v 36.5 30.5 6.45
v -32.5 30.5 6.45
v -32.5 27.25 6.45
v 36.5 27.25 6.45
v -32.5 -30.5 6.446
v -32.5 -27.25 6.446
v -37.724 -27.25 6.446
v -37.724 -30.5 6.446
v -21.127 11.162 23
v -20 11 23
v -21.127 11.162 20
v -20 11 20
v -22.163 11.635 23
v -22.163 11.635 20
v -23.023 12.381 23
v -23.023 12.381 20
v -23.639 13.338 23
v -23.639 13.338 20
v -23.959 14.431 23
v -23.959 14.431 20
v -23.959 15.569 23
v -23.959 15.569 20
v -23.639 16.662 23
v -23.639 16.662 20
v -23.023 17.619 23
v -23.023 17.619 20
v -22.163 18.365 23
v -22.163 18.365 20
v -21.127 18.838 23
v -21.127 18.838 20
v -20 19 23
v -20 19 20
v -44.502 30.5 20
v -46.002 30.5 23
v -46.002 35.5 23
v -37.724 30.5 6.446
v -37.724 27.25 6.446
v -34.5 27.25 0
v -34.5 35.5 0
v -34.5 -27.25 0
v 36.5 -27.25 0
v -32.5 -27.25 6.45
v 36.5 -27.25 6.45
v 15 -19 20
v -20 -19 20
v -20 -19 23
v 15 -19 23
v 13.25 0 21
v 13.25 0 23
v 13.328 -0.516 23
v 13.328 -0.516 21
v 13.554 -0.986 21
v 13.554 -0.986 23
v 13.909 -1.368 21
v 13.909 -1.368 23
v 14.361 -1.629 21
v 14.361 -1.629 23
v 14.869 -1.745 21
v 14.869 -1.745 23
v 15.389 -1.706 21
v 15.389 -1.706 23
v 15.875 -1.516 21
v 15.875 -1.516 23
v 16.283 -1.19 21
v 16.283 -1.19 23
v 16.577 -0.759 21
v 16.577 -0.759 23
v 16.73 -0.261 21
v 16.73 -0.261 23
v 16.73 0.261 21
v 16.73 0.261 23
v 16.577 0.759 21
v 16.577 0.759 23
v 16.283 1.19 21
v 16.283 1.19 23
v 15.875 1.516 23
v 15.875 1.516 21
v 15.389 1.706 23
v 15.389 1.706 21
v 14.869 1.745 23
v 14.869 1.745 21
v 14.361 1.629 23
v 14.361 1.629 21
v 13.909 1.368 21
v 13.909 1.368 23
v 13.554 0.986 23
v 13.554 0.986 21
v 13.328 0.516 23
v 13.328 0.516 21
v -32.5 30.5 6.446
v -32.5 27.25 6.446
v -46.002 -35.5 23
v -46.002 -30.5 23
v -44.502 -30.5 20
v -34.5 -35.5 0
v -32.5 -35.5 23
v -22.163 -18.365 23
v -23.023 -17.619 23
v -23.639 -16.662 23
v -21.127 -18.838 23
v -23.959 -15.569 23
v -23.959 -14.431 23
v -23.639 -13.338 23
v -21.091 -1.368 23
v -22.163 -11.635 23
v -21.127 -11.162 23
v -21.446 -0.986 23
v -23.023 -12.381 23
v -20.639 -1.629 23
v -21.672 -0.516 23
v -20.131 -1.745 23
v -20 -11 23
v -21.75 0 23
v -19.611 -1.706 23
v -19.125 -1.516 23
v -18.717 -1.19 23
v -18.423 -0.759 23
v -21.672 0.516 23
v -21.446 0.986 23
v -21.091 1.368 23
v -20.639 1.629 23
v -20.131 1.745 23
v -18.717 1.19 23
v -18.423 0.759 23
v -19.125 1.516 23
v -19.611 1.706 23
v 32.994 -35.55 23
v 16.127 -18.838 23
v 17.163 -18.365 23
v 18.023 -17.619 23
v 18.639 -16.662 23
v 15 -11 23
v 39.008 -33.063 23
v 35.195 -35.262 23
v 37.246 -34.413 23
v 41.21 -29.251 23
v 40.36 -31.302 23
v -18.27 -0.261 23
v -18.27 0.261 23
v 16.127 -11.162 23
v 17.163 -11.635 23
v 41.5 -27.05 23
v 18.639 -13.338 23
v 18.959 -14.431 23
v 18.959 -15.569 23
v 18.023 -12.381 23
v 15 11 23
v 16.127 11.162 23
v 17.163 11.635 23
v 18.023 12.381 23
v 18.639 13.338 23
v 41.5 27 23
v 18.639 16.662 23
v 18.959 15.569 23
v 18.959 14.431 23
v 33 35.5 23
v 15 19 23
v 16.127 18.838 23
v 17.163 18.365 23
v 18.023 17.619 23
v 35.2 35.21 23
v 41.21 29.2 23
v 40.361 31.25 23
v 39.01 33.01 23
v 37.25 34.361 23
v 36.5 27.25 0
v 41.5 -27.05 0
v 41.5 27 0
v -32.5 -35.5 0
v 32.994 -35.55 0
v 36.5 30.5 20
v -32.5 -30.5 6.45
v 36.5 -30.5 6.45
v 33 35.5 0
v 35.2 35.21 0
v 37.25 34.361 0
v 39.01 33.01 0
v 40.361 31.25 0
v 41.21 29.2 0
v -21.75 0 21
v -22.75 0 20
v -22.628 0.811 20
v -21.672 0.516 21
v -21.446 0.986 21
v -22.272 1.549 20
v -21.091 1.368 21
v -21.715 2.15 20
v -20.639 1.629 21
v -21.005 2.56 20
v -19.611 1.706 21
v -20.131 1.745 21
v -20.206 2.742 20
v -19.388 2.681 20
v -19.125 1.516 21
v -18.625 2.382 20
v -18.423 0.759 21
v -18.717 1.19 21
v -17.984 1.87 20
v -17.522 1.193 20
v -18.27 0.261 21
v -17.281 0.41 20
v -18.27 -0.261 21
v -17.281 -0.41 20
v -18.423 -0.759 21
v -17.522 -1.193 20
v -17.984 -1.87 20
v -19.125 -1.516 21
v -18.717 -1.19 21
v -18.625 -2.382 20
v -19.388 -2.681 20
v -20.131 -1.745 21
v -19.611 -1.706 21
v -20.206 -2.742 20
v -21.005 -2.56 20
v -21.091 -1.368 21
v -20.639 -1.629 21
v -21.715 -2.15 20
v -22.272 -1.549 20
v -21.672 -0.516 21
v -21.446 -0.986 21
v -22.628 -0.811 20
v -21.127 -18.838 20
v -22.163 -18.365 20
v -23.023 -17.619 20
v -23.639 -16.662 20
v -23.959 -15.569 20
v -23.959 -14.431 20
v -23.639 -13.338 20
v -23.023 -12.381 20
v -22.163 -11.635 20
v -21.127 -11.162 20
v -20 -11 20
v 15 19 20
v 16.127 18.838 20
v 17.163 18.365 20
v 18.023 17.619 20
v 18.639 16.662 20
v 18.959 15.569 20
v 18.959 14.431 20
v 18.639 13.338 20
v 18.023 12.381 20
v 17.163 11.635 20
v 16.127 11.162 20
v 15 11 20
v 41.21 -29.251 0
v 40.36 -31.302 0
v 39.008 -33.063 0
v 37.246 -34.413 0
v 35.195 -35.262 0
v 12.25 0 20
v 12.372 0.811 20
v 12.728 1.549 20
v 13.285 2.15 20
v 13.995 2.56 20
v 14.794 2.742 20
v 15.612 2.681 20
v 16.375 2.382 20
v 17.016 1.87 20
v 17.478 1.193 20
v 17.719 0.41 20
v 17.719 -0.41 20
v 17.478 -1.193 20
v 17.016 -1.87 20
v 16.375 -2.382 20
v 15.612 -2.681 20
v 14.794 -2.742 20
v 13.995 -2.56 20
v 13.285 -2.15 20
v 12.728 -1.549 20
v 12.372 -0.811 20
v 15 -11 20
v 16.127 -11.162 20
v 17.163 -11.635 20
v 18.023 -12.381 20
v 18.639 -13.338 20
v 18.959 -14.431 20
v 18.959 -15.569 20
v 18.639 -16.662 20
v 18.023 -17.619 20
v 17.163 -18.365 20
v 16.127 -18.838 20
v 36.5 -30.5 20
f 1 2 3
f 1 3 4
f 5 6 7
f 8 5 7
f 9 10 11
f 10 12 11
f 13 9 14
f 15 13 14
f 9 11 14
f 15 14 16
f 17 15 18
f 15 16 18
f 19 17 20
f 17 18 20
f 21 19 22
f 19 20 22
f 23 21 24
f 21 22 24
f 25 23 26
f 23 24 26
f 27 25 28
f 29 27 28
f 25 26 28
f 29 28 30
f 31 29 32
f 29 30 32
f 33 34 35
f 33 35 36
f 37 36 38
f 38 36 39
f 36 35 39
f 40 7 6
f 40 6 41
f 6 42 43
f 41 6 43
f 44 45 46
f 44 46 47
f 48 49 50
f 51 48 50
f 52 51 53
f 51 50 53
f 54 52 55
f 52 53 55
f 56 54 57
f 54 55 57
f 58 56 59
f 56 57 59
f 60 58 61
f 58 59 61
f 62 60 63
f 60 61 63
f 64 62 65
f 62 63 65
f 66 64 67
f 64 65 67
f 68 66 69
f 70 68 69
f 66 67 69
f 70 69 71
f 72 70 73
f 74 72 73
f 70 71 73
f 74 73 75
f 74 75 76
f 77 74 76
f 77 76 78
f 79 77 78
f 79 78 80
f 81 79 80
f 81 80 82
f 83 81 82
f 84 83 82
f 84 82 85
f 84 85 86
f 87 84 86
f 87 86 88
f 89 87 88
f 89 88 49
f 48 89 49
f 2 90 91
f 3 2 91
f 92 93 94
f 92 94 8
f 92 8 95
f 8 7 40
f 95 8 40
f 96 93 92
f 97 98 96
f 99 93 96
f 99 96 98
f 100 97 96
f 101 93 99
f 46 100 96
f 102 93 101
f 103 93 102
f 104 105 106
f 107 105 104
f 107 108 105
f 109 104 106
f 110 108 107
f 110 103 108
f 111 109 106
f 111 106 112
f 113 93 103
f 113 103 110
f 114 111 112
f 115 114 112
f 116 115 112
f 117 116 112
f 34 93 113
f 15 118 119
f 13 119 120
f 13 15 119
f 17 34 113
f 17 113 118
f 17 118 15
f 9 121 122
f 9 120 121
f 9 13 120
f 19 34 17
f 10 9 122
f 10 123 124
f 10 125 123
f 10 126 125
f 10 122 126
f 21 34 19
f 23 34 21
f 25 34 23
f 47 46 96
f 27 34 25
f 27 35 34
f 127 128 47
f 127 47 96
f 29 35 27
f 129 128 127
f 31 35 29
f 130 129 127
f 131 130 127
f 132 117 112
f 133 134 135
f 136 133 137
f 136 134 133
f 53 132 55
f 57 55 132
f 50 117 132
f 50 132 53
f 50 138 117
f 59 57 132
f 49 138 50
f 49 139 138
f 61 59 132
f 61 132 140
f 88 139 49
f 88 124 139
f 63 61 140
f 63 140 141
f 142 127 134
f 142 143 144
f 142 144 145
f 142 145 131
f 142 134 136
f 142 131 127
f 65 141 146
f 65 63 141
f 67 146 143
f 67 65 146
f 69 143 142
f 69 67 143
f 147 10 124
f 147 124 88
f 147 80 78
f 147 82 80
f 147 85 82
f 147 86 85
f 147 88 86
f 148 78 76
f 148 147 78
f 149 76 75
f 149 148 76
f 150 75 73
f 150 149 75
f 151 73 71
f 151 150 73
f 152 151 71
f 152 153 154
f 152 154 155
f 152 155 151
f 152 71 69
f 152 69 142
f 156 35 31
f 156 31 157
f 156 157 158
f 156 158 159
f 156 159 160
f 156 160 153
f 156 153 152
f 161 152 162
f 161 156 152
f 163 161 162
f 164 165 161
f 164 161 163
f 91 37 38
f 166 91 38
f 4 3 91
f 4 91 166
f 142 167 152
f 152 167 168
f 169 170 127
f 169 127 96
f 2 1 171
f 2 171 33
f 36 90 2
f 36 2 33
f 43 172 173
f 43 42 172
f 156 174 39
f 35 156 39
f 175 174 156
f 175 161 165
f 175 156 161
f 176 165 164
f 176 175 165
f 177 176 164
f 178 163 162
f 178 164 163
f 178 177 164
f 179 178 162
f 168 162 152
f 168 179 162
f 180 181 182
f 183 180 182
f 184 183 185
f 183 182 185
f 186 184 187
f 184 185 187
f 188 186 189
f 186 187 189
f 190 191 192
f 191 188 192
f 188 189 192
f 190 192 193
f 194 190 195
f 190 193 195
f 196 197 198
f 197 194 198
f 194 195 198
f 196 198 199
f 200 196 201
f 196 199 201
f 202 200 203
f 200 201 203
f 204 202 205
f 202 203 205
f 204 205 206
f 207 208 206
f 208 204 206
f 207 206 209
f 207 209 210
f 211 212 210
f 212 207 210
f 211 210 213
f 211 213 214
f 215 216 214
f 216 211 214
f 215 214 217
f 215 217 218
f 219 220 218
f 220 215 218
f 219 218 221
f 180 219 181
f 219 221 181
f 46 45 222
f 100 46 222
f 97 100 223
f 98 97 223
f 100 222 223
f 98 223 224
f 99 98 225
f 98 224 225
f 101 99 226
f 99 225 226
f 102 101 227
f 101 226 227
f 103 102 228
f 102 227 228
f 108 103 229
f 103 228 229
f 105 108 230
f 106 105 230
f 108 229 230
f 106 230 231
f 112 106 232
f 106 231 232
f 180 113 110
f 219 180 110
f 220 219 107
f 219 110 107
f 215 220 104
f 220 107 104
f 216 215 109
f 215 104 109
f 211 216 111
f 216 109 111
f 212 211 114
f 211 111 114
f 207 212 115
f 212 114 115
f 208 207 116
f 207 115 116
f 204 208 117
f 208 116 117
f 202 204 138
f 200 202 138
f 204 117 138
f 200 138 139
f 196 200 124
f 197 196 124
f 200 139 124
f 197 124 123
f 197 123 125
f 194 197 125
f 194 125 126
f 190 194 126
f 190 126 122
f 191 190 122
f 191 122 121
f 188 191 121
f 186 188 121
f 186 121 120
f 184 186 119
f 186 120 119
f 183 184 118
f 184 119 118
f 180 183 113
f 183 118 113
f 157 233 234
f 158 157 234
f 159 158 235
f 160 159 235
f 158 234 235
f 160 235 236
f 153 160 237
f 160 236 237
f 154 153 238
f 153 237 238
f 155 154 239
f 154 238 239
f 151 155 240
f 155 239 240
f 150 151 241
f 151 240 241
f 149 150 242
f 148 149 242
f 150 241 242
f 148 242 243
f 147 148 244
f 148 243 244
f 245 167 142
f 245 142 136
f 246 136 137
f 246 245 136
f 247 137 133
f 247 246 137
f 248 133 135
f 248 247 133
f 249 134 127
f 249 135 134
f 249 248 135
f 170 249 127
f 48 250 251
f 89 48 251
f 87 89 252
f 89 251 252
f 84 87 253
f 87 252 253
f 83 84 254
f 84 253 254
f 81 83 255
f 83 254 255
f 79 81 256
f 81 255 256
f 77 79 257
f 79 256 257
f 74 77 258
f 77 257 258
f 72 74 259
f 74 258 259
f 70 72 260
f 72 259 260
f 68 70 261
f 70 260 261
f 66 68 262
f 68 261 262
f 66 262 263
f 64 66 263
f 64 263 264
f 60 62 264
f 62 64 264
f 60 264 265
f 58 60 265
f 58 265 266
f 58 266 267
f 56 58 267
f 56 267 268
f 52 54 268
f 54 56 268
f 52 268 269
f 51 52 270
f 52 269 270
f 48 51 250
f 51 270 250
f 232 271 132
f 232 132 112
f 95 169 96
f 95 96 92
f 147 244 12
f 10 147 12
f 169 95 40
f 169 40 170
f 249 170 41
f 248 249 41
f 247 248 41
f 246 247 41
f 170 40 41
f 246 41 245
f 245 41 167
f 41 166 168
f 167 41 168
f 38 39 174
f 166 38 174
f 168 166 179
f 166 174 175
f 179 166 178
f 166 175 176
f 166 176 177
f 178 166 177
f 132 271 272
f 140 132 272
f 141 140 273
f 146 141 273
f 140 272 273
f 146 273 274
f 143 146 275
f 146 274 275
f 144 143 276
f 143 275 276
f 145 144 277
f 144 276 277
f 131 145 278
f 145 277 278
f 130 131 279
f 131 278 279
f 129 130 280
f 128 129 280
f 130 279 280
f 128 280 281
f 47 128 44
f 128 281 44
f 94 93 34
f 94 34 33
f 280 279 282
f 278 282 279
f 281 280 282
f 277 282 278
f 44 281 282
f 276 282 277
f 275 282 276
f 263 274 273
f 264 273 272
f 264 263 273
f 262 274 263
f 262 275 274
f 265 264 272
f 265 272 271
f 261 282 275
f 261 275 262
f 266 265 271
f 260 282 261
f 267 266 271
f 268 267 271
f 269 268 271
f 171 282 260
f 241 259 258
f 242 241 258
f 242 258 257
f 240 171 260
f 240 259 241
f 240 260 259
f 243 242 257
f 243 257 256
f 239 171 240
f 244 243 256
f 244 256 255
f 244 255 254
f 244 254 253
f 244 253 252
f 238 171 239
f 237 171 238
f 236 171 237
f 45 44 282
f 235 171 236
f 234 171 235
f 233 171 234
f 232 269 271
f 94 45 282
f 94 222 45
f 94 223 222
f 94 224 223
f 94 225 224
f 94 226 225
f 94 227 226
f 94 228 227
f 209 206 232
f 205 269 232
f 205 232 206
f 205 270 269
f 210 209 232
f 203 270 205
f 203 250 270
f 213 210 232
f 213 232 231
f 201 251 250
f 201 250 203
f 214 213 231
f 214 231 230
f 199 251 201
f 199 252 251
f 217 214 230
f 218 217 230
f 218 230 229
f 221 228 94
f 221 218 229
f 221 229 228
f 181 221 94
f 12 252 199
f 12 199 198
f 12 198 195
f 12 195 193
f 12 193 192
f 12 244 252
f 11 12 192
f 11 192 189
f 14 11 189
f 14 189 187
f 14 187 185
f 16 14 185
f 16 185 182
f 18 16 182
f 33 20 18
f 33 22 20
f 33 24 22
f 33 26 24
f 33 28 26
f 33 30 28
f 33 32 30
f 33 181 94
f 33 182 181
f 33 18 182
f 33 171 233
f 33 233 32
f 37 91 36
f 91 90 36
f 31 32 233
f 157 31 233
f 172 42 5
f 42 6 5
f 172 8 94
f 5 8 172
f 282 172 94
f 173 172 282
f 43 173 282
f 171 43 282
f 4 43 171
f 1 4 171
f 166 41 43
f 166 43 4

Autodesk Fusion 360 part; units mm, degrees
sketch "Sketch1" plane through (0, 0, 0) normal (0, 0, 1) x (1, 0, 0)
  line L0 (36.5, 30.5) -> (-32.5, 30.5)
  line L1 (-32.5, 30.5) -> (-32.5, -30.5)
  line L2 (-32.5, -30.5) -> (36.5, -30.5)
  line L3 (36.5, -30.5) -> (36.5, 30.5)
  line L4 (36.5, -27.25) -> (-32.5, -27.25)
  line L5 (-32.5, -27.25) -> (-32.5, 27.25)
  line L6 (-32.5, 27.25) -> (36.5, 27.25)
  line L7 (36.5, 27.25) -> (36.5, -27.25)
  line L8 (33, 35.5) -> (-32.5, 35.5)
  line L9 (-32.5, 35.5) -> (-32.5, 30.5)
  line L10 (1.75, 0) -> (22.5, 0)
  line L11 (-32.5, -35.5) -> (-32.5, -30.5)
  line L12 (32.9935, -35.55) -> (-32.5, -35.5)
  line L13 (41.5, -27.05) -> (41.5, 27)
  arc A0 (32.9935, -35.55) -> (41.5, -27.05) centre (33, -27.05) ccw
  arc A1 (41.5, 27) -> (33, 35.5) centre (33, 27) ccw
  dimension "d1" = 69
  dimension "d2" = 61
  dimension "d3" = 69
  dimension "d4" = 54.5
  dimension "d46" = 8.5
extrude "Extrude1" add sketch "Sketch1" along normal blind 6.45 contours L0 L1 L3 L6 | L0 L2 L3 L7 L8 L9 L11 L12 L13 A0 A1 | L1 L2 L3 L4
extrude "Extrude2" add sketch "Sketch1" along normal blind 22 contours L0 L2 L3 L7 L8 L9 L11 L12 L13 A0 A1
extrude "Extrude3" add sketch "Sketch1" along normal blind 23 and the other way blind -20
sketch "Sketch2" plane through (0, 0, 23) normal (0, 0, 1) x (-1, 0, 0)
  line L0 (-33, -35.5) -> (32.5, -35.5)
  line L1 (32.5, -35.5) -> (32.5, 35.5)
  line L2 (32.5, 35.5) -> (-32.9935, 35.55)
  circle A0 centre (20, 0) radius 1.75
  circle A1 centre (-15, 0) radius 1.75
  arc A2 (-32.9935, 35.55) -> (-41.5, 27.05) centre (-33, 27.05) ccw
  line L3 (-41.5, 27.05) -> (-41.5, -27)
  arc A3 (-41.5, -27) -> (-33, -35.5) centre (-33, -27) ccw
  dimension "d33" = 3.5
  dimension "d34" = 3.5
extrude "Extrude4" cut sketch "Sketch2" against normal blind 5 contours A0 | A1
sketch "Sketch3" plane through (0, 35.5, 0) normal (0, 1, 0) x (-1, 0, 0)
  line L0 (-33, 0) -> (32.5, 0)
  line L1 (32.5, 0) -> (32.5, 23)
  line L2 (32.5, 23) -> (-33, 23)
  line L3 (32.5, 23) -> (34.5, 23)
  line L4 (34.5, 23) -> (34.5, 0)
  line L5 (34.5, 0) -> (32.5, 0)
  line L6 (34.5, 0) -> (34.5, 8)
  line L7 (34.5, 23) -> (46.0025, 23)
  line L8 (34.5, 0) -> (46.0025, 23)
  line L9 (-33, 23) -> (-33, 0)
  dimension "d47" = 26.57
extrude "Extrude5" add sketch "Sketch3" against normal blind 5 contours L1 L3 L4 L5 L6 | L4 L6 L7 L8
extrude "Extrude6" add sketch "Sketch3" along normal blind -71 and the other way blind 66 contours L1 L3 L4 L5 L6 | L4 L6 L7 L8
sketch "Sketch4" plane through (0, 30.5, 0) normal (0, -1, 0) x (1, 0, 0)
  line L0 (-32.5, 20) -> (-32.5, 23)
  line L1 (-32.5, 23) -> (-46.0025, 23)
  line L2 (-46.0025, 23) -> (-34.5, 0)
  line L3 (-34.5, 0) -> (-37.7235, 6.4455)
  line L4 (-32.5, 6.4455) -> (-37.7235, 6.4455)
  line L5 (-32.5, 6.4455) -> (-32.5, 0)
  line L6 (-34.5, 0) -> (-32.5, 0)
  line L7 (36.5, 20) -> (-32.5, 20)
  line L8 (-32.5, 6.45) -> (36.5, 6.45)
  line L9 (36.5, 6.45) -> (36.5, 20)
extrude "Extrude7" add sketch "Sketch4" along normal blind 3.25
extrude "Extrude8" add sketch "Sketch4" along normal blind 61 and the other way blind -57.75
chamfer "Chamfer2" distance 1 angle 45 2 edges at (-18.3684, 0.6328, 20) (16.6316, 0.6328, 20)
sketch "Sketch5" plane through (0, 30.5, 0) normal (0, -1, 0) x (1, 0, 0)
  line L0 (-37.7235, 6.4455) -> (-32.5, 6.4455)
  line L1 (-32.5, 6.4455) -> (-32.5, 6.45)
  line L2 (-46.0025, 23) -> (-37.7235, 6.4455)
  line L3 (-32.5, 6.45) -> (36.5, 6.45)
  line L4 (36.5, 6.45) -> (36.5, 20)
  line L5 (36.5, 20) -> (-32.5, 20)
  line L6 (-46.0025, 23) -> (-27, 23)
  line L7 (-29, 20) -> (-51.5326, 20)
  line L8 (-43.3815, 17.7592) -> (-46.4301, 23.8551)
  line L9 (-28, 19) -> (-27.5232, 25.3132)
extrude "Extrude9" add sketch "Sketch5" along normal blind 61 contours L2 L5 L6 L7 L8 L9
sketch "Sketch6" plane through (0, 0, 20) normal (0, 0, -1) x (1, 0, 0)
  circle A0 centre (-20, 0) radius 2.75
  line L0 (36.5, 30.5) -> (-44.5022, 30.5)
  line L1 (-44.5022, -30.5) -> (36.5, -30.5)
  line L2 (36.5, -30.5) -> (36.5, 30.5)
  circle A1 centre (15, 0) radius 2.75
  line L3 (15, -11) -> (-20, -11)
  arc A2 (-20, -11) -> (-20, -19) centre (-20, -15) ccw
  line L4 (-20, -19) -> (15, -19)
  arc A3 (15, -19) -> (15, -11) centre (15, -15) ccw
  line L5 (15, -15) -> (-20, -15) construction
  line L6 (1.75, 0) -> (22.5, 0)
  line L7 (-20, 19) -> (15, 19)
  arc A4 (15, 11) -> (15, 19) centre (15, 15) ccw
  line L8 (15, 11) -> (-20, 11)
  arc A5 (-20, 19) -> (-20, 11) centre (-20, 15) ccw
  line L9 (-44.5022, 30.5) -> (-44.5022, -30.5)
extrude "Extrude10" cut sketch "Sketch6" against normal blind 25 contours L3 A2 L4 A3 | L7 A4 L8 A5
